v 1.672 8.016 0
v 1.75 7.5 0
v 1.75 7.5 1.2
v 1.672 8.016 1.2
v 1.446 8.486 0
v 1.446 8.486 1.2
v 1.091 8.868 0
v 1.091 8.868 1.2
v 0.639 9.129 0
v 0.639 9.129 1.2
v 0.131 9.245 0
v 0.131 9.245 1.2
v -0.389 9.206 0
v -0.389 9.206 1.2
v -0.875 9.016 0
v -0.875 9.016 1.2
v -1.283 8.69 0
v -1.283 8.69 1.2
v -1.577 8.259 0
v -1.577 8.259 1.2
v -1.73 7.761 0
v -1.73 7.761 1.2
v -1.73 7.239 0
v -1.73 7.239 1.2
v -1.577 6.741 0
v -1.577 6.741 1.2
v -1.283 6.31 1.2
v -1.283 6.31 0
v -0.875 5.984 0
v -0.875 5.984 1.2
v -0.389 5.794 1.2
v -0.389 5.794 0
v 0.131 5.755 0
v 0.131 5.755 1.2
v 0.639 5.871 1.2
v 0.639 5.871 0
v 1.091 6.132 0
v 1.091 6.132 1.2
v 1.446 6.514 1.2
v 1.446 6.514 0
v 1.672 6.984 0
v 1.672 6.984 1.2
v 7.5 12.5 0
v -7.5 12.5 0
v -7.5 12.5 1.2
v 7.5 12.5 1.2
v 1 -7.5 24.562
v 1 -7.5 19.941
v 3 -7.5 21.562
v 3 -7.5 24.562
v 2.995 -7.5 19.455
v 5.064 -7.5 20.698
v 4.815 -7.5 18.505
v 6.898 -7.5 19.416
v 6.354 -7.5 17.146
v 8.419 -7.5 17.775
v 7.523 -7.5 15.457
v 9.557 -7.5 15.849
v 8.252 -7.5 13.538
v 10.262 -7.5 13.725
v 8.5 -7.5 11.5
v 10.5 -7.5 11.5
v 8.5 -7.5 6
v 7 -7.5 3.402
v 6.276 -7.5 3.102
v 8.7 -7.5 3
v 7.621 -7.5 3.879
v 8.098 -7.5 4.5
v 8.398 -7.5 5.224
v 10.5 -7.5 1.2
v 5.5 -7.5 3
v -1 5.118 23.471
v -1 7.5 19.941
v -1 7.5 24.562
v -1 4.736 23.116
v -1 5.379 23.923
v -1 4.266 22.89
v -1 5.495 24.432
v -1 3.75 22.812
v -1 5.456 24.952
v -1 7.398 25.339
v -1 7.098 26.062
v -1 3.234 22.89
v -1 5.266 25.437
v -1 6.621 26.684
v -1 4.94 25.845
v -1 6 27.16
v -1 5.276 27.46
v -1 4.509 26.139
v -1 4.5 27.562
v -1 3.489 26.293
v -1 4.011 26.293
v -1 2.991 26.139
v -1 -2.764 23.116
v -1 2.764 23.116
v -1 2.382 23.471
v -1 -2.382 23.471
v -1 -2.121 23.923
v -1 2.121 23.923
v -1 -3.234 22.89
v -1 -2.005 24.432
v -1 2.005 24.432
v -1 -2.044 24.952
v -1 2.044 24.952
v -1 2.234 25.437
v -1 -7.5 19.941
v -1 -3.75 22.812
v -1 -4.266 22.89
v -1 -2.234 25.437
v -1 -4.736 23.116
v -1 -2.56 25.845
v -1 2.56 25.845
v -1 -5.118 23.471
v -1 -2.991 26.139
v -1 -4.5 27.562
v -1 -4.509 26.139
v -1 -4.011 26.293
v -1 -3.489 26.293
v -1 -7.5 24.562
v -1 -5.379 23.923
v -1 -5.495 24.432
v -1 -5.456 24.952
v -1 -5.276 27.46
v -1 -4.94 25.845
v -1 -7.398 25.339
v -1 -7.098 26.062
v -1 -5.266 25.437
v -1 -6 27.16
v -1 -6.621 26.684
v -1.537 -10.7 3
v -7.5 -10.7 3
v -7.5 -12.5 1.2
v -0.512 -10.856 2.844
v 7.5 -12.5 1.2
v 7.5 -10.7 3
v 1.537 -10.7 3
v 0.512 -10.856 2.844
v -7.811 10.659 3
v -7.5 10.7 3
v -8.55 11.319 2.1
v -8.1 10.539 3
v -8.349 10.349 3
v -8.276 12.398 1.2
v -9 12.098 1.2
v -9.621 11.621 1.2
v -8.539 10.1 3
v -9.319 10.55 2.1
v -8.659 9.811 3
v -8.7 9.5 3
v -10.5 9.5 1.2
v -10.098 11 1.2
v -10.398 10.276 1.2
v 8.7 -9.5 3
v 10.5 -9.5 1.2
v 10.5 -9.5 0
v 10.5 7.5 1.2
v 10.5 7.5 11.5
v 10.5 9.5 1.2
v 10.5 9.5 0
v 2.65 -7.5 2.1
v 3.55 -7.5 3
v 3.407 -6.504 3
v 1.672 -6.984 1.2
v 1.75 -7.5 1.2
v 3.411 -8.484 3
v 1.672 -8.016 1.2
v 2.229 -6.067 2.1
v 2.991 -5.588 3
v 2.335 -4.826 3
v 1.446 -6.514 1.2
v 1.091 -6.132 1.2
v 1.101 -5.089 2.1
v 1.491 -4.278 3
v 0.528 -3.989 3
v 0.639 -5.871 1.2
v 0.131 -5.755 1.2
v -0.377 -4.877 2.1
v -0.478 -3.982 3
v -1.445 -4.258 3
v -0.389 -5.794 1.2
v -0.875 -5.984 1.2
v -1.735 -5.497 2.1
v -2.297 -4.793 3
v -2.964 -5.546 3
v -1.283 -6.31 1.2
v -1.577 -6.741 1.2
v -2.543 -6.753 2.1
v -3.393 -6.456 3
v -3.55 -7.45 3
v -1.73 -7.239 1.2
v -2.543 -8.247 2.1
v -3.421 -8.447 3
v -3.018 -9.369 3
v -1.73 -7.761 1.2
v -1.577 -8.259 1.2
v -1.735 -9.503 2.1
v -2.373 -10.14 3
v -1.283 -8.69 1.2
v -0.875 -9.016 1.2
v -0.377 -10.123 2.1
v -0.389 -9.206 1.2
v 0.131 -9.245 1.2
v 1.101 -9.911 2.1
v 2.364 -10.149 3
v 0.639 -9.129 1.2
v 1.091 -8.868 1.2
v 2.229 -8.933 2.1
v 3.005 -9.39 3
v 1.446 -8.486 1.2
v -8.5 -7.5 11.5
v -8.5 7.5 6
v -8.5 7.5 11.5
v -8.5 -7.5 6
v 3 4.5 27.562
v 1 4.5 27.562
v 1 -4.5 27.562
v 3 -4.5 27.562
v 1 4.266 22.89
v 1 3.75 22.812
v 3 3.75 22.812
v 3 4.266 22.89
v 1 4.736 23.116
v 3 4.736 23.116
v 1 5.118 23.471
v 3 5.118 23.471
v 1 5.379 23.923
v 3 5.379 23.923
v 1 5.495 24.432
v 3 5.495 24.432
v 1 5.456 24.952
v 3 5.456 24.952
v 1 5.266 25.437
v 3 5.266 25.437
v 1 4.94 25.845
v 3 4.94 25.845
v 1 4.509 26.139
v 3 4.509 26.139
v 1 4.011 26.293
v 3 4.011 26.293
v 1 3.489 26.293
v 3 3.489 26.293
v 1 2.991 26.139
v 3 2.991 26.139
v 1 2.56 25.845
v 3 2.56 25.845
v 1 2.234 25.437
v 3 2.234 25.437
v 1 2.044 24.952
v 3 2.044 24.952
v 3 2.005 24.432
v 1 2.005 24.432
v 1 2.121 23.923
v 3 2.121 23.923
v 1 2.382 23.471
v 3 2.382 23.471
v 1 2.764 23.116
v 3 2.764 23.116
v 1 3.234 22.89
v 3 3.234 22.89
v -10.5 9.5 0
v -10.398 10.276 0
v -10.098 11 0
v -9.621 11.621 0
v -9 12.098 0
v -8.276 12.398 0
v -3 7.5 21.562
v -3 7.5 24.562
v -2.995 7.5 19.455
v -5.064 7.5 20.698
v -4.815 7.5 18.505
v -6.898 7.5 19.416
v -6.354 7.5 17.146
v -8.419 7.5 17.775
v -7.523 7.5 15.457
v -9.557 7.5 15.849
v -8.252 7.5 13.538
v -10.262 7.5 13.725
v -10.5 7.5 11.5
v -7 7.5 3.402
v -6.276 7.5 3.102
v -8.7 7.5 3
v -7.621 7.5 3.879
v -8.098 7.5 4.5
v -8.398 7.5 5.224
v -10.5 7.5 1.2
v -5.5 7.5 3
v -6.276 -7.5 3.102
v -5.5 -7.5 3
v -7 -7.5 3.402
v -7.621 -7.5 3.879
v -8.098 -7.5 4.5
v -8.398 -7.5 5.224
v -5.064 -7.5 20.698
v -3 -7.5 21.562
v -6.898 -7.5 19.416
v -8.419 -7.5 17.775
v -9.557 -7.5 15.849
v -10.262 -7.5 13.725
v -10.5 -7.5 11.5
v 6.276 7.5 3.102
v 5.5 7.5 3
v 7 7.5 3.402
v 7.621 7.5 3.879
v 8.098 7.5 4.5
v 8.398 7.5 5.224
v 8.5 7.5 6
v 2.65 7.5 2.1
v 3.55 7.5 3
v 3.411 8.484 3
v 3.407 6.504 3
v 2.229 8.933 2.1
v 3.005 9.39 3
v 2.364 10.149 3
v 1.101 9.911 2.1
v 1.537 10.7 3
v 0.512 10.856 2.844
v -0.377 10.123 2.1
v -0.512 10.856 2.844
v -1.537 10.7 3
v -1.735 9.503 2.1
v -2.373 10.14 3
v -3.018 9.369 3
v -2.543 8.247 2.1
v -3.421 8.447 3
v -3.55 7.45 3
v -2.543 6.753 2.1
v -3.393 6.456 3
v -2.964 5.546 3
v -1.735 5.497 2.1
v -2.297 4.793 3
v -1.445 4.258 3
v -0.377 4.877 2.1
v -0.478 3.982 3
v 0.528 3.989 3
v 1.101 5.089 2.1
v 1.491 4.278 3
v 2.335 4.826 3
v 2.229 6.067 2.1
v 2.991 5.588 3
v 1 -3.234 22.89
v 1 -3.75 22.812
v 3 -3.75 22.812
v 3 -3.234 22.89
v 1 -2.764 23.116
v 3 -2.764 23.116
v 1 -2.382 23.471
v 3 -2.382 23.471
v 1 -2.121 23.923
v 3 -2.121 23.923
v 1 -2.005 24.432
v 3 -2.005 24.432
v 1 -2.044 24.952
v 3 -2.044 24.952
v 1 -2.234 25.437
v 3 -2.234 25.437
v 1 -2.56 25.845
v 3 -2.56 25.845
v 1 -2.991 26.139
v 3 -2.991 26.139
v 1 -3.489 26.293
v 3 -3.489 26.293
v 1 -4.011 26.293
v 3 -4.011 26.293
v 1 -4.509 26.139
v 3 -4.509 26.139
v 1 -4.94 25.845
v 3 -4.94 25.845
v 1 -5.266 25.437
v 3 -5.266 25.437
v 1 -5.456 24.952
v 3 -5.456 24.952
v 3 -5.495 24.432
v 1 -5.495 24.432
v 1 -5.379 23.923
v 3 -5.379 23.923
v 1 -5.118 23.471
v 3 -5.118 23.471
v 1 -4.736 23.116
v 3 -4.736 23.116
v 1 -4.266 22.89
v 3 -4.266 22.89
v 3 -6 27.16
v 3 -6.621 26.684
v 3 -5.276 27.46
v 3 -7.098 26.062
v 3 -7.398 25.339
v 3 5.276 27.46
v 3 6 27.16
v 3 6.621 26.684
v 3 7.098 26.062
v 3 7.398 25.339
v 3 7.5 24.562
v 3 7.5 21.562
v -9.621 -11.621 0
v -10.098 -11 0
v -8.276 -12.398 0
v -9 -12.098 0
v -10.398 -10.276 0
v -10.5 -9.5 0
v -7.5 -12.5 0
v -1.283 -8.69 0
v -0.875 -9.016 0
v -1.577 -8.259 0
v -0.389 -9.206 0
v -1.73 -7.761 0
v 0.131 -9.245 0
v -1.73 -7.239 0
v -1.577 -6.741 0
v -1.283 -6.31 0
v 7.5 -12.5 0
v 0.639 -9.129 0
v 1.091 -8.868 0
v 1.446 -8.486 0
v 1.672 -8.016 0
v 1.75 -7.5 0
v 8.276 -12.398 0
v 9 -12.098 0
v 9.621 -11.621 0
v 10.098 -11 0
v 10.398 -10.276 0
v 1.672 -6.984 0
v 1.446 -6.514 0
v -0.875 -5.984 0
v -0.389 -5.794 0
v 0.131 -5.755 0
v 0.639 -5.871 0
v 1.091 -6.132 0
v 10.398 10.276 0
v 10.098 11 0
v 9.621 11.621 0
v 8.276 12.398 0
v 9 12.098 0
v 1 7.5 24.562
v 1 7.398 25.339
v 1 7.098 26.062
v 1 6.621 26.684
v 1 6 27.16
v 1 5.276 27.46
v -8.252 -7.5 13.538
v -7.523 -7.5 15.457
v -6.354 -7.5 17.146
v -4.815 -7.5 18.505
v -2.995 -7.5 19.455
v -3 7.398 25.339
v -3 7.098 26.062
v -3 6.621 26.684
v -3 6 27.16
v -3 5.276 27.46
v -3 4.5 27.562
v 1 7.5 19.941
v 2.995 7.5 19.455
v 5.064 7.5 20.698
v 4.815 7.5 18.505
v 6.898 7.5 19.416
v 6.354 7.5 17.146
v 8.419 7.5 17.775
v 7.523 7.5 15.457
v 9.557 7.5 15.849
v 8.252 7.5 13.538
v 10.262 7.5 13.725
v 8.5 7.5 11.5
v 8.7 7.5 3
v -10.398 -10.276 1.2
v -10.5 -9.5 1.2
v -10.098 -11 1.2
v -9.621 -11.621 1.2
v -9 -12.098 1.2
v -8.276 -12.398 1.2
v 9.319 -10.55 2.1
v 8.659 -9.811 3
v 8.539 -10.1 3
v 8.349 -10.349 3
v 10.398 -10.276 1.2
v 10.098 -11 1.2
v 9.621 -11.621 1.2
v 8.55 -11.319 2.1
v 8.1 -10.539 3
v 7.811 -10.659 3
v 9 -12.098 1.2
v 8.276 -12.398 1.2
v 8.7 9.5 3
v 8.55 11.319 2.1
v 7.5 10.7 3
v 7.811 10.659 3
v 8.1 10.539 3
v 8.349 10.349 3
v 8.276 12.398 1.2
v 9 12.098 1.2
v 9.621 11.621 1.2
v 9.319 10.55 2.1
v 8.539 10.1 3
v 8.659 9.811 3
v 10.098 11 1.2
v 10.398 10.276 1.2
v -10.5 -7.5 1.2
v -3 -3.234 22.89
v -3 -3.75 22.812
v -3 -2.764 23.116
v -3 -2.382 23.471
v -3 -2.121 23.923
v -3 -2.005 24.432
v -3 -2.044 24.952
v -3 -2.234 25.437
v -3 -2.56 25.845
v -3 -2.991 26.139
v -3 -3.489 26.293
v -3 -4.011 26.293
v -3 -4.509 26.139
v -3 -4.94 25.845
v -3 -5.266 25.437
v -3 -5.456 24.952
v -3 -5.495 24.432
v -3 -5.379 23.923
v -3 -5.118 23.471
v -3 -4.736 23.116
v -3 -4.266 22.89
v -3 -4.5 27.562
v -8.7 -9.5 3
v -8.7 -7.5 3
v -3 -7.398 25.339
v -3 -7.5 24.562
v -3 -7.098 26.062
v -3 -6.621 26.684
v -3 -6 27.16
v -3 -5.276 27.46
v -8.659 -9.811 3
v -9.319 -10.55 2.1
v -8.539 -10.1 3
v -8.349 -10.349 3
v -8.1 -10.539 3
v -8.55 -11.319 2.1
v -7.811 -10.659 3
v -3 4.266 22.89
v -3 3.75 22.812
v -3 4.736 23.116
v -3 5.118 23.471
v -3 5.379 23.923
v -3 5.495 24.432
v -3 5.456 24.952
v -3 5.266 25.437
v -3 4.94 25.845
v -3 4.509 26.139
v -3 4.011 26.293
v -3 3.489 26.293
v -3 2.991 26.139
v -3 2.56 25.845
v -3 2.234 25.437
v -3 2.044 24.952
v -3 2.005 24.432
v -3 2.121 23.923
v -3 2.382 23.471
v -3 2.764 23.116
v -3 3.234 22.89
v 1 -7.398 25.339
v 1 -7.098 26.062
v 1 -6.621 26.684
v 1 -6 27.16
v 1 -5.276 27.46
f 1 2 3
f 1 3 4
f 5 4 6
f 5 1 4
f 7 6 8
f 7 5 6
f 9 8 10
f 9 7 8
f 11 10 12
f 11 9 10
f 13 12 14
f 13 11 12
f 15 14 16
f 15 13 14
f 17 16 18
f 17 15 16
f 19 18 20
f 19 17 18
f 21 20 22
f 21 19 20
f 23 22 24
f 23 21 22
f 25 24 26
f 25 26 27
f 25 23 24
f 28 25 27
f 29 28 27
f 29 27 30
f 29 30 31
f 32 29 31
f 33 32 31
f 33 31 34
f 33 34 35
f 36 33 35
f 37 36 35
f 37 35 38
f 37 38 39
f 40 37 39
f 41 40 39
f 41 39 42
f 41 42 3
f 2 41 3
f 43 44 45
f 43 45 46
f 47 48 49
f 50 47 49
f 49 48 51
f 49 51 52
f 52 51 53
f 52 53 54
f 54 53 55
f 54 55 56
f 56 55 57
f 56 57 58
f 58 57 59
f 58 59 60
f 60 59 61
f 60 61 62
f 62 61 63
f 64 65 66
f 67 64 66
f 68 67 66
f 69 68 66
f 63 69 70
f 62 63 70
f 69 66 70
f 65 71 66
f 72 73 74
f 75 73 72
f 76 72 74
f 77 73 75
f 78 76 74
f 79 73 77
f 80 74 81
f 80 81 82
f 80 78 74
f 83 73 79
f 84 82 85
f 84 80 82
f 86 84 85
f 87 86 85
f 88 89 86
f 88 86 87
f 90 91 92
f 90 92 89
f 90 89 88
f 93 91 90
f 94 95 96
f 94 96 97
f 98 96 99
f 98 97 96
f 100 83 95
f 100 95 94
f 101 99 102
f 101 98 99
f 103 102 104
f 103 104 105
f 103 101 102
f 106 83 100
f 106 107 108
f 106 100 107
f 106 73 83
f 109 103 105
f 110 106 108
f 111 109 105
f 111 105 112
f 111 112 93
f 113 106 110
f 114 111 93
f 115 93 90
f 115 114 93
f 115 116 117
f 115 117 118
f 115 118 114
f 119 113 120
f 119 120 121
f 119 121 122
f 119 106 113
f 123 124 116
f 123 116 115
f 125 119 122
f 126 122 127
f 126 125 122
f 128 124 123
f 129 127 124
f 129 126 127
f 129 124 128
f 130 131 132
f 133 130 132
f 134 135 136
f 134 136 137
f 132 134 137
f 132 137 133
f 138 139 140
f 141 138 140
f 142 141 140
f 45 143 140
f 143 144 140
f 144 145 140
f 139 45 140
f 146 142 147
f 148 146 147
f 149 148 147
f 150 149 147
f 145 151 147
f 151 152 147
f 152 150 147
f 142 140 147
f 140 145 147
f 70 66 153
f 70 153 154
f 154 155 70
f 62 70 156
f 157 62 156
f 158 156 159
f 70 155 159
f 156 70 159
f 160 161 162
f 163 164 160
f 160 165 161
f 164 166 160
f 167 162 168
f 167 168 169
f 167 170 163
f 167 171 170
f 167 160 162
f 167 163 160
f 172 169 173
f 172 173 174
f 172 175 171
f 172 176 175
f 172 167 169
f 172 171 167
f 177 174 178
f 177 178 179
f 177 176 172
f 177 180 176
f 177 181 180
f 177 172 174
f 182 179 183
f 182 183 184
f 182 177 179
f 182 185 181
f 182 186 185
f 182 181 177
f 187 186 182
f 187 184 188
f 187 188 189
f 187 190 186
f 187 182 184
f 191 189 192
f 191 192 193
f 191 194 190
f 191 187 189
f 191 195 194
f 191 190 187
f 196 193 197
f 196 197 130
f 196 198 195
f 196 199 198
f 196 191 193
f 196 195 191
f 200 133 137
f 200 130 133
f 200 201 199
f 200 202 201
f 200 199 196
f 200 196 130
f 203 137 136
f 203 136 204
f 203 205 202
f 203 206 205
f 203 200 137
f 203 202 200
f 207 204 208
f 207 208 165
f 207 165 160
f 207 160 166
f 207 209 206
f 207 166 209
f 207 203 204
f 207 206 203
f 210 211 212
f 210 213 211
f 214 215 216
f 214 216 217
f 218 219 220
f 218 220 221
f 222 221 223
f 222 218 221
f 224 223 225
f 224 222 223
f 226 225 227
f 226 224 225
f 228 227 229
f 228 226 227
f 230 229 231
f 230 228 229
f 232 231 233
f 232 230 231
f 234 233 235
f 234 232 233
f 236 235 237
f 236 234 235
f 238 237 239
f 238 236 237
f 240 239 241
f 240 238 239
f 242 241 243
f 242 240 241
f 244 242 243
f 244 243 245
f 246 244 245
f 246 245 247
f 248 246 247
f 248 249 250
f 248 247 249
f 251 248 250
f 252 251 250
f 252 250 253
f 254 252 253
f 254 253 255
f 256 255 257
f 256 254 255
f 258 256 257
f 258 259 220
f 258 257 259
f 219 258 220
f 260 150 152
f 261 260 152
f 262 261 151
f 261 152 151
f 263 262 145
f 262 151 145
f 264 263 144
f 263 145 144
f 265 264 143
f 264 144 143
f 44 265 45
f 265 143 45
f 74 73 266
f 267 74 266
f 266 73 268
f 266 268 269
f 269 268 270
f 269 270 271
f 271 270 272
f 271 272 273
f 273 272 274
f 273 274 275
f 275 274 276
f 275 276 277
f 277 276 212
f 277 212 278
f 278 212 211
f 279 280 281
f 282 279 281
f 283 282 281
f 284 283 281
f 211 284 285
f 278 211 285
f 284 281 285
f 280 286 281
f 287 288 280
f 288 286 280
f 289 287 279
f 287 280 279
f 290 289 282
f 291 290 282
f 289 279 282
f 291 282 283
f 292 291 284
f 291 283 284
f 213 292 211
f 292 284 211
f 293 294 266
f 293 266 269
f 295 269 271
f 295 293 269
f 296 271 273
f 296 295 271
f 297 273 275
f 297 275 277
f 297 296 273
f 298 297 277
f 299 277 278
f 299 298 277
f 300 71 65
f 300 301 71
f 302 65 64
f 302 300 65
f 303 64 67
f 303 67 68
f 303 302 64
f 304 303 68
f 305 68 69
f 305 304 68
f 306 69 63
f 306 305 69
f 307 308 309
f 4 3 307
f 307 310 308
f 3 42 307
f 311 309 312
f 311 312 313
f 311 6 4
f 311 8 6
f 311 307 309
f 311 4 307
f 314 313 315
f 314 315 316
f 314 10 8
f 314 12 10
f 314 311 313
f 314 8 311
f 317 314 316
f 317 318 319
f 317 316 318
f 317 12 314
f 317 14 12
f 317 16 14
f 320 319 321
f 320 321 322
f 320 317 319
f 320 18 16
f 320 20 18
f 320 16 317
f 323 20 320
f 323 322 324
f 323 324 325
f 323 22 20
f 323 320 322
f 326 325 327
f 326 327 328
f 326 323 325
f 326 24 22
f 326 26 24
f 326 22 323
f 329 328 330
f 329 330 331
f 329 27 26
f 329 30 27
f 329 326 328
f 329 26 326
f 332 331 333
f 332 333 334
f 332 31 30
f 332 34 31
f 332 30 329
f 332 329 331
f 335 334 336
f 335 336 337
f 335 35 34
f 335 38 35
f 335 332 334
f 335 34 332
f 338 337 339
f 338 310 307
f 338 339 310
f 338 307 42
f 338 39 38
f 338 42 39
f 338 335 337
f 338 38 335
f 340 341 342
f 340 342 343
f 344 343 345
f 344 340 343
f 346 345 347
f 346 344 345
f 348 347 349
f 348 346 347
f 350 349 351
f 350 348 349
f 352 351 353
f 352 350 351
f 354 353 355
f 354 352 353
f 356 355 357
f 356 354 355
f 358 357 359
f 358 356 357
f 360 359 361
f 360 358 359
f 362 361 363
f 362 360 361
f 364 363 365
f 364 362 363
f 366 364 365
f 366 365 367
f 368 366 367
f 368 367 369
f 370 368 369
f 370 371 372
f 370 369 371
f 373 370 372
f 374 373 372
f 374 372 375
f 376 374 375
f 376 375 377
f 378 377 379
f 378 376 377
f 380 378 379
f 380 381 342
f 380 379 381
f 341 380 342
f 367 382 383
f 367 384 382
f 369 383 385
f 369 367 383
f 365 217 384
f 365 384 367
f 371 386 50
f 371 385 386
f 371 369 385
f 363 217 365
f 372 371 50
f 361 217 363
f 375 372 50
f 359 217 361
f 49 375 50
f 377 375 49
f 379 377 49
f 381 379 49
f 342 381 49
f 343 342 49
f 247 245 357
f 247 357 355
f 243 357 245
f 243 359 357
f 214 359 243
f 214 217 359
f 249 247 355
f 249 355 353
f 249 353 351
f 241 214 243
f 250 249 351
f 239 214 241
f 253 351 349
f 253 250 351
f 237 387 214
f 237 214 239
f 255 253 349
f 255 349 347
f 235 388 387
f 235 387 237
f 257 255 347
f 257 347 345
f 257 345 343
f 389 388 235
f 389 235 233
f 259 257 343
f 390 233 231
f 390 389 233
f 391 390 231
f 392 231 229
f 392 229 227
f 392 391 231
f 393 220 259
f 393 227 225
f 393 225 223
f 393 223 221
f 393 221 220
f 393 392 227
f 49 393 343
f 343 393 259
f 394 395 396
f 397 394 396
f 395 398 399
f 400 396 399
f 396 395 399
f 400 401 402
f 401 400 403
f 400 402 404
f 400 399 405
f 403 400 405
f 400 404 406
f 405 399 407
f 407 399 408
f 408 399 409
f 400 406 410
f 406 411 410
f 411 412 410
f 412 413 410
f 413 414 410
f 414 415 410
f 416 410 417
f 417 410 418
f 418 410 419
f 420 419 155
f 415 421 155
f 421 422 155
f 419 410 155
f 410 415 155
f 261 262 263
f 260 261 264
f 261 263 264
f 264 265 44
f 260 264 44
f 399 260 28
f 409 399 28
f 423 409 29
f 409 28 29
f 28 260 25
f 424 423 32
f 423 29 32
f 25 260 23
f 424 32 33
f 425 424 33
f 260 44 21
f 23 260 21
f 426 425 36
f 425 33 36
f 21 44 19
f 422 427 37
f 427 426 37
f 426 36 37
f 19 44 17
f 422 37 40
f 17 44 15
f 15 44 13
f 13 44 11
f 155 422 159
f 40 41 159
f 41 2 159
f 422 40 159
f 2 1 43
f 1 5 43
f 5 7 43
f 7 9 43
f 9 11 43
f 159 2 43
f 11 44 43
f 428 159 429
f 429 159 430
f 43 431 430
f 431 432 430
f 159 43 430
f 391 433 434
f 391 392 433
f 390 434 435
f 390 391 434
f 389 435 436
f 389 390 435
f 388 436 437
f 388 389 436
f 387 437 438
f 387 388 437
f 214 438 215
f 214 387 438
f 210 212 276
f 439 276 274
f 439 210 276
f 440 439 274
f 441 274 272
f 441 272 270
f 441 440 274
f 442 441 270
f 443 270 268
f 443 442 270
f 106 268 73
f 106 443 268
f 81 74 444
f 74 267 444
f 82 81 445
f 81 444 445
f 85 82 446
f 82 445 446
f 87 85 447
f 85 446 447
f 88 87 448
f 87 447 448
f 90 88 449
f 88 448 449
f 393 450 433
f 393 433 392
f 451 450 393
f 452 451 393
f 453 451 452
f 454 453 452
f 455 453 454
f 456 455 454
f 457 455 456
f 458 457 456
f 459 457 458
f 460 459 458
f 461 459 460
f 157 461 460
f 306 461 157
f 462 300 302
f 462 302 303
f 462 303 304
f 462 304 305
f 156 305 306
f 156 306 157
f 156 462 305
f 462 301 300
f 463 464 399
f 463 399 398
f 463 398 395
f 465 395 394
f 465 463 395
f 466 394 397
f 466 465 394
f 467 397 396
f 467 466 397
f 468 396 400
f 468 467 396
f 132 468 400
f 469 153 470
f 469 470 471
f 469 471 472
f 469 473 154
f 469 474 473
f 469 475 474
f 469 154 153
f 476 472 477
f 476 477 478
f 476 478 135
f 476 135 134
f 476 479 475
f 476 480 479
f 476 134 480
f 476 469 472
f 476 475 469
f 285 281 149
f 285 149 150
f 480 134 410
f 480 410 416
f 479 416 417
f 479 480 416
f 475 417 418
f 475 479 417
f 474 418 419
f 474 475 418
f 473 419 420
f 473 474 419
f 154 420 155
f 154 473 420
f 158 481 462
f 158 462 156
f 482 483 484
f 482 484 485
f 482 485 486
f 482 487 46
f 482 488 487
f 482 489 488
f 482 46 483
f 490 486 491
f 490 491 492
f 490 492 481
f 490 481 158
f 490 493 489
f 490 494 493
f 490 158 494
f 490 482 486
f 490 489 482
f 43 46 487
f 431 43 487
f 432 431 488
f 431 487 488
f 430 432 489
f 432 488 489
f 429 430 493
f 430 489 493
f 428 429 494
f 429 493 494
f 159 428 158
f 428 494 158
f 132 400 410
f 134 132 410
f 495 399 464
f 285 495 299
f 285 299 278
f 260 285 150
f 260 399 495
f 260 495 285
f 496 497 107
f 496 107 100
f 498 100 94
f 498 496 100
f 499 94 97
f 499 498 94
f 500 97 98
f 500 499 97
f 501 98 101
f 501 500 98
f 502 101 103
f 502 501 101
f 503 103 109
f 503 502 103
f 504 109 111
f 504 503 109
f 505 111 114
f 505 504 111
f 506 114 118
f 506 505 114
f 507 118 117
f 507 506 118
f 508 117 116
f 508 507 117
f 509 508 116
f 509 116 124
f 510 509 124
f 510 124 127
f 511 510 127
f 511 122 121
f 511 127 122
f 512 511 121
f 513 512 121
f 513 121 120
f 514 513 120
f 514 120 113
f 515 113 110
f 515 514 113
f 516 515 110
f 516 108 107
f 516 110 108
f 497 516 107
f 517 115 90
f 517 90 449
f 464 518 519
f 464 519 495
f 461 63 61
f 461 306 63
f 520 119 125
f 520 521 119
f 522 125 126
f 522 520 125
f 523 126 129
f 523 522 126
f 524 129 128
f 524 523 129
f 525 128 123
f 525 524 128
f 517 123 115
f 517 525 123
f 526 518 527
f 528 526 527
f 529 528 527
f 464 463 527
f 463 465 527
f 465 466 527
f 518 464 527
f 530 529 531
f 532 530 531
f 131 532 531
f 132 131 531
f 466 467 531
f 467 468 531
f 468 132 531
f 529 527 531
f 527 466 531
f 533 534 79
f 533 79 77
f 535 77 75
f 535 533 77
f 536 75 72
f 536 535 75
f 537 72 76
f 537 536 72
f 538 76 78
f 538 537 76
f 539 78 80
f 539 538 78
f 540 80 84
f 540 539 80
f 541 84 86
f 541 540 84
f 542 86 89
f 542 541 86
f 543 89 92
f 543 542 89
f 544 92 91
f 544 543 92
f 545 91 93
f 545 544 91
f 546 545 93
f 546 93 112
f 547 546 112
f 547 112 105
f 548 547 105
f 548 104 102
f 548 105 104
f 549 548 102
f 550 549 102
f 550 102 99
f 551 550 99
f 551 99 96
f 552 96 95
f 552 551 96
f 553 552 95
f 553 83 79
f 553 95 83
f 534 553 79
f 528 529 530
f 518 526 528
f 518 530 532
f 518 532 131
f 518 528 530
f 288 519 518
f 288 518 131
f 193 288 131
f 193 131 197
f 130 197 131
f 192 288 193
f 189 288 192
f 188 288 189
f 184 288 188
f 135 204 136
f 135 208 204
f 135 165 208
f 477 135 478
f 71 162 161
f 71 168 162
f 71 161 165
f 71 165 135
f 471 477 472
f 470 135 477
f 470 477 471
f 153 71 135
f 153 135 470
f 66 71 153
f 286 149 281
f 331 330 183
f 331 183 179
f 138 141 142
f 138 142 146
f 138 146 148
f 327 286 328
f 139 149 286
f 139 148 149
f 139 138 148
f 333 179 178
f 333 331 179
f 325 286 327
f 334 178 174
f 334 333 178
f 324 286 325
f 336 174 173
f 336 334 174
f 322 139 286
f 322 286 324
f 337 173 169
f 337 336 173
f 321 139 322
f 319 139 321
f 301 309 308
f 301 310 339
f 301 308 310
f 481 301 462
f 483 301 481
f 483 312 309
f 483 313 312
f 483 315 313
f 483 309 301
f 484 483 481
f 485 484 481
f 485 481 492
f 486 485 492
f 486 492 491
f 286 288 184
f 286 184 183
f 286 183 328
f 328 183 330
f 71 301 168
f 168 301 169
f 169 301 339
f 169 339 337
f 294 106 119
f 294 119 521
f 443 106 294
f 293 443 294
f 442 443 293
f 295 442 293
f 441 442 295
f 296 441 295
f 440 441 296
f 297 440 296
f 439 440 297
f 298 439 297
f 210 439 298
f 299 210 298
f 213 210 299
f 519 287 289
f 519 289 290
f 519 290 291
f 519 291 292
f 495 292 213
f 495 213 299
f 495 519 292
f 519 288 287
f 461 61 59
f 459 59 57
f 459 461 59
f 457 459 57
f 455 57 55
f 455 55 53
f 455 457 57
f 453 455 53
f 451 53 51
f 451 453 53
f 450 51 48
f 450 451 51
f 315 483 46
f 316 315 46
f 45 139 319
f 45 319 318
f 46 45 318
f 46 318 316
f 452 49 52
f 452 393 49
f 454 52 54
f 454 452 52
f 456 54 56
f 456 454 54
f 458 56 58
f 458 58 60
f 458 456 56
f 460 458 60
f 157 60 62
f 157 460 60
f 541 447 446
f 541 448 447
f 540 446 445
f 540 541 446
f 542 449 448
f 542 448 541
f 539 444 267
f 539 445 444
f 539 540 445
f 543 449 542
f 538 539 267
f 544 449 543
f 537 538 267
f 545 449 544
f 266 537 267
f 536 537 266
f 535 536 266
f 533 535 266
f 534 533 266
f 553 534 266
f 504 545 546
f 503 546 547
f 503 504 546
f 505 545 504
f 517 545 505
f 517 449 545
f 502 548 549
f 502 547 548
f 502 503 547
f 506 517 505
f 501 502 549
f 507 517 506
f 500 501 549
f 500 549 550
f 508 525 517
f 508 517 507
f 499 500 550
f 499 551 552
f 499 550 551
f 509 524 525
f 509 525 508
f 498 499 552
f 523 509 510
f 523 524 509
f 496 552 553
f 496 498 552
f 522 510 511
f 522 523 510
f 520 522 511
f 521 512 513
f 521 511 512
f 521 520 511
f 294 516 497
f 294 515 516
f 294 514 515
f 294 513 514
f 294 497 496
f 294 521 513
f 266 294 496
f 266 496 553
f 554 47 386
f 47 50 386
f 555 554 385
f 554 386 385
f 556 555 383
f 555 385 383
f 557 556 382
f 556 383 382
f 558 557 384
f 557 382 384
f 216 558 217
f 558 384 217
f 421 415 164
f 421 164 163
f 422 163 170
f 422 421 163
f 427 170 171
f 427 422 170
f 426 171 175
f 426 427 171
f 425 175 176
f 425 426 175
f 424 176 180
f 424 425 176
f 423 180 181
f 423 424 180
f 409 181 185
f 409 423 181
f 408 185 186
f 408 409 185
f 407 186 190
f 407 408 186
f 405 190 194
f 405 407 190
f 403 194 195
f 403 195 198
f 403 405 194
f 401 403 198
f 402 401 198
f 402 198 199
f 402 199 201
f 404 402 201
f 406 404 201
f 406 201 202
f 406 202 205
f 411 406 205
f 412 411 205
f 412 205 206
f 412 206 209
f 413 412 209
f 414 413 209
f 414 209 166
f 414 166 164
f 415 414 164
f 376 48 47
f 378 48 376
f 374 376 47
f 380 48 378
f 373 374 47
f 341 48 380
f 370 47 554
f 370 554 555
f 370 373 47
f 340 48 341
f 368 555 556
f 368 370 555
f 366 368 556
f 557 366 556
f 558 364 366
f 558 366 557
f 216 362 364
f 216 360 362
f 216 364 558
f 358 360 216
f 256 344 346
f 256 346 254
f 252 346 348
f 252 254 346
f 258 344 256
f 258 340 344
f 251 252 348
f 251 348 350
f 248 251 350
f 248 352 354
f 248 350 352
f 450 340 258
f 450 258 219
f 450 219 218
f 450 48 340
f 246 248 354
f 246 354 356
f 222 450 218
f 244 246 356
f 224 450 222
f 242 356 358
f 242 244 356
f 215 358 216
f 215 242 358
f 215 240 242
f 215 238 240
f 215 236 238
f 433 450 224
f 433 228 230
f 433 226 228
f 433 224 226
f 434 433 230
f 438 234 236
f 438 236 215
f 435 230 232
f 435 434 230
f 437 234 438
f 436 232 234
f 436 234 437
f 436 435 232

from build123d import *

# Parameters (mm, degrees)
SKETCH1_W               = 21
SKETCH1_H               = 25
SKETCH1_R               = 1.75
BOSS_EXTRUDE1_DEPTH     = 3
BOSS_EXTRUDE2_DEPTH     = 7.5
CUT_EXTRUDE1_DEPTH      = 34.138809672
CUT_EXTRUDE1_DEPTH_BACK = 34.138809672
SKETCH4_R               = 1.75
FILLET1_R               = 3
FILLET3_R               = 3
CHAMFER1_SIZE           = 1.8


with BuildPart() as part:
    # Sketch1 → Boss-Extrude1 (new body)
    with BuildSketch(Plane.XY):
        Rectangle(SKETCH1_W, SKETCH1_H)
        with Locations((0, 7.5)):
            Circle(SKETCH1_R, mode=Mode.SUBTRACT)
        with Locations((0, -7.5)):
            Circle(SKETCH1_R, mode=Mode.SUBTRACT)
    extrude(amount=BOSS_EXTRUDE1_DEPTH)

    # Sketch3 → Boss-Extrude2 (add, symmetric)
    with BuildSketch(Plane(origin=(0, 0, 0), x_dir=(1, 0, 0), z_dir=(0, 1, 0))):
        with BuildLine():
            Line((-8.5, -3), (-8.5, -11.5))
            ThreePointArc((-8.5, -11.5), (-6.354132514, -17.145794895), (-1, -19.940971508))
            Line((-1, -19.940971508), (-1, -27.562305899))
            Line((-1, -27.562305899), (-3, -27.562305899))
            Line((-3, -27.562305899), (-3, -21.562305899))
            ThreePointArc((-3, -21.562305899), (-8.41872912, -17.774950199), (-10.5, -11.5))
            Line((-10.5, -11.5), (-10.5, -3))
            Line((-10.5, -3), (-8.5, -3))
        make_face()
        with BuildLine():
            Line((10.5, -11.5), (10.5, -3))
            Line((10.5, -3), (8.5, -3))
            Line((8.5, -3), (8.5, -11.5))
            ThreePointArc((8.5, -11.5), (6.354132514, -17.145794895), (1, -19.940971508))
            Line((1, -19.940971508), (1, -27.562305899))
            Line((1, -27.562305899), (3, -27.562305899))
            Line((3, -27.562305899), (3, -21.562305899))
            ThreePointArc((3, -21.562305899), (8.41872912, -17.774950199), (10.5, -11.5))
        make_face()
    extrude(amount=BOSS_EXTRUDE2_DEPTH, both=True)

    # Sketch4 → Cut-Extrude1 (cut, two sides: drawn at the far end of the back side and taken through both)
    with BuildSketch(Plane(origin=(3, 0, 0), x_dir=(0, 0, -1), z_dir=(1, 0, 0)).offset(-CUT_EXTRUDE1_DEPTH_BACK)):
        with Locations((-24.562305899, 3.75)):
            Circle(SKETCH4_R)
        with Locations((-24.562305899, -3.75)):
            Circle(SKETCH4_R)
    extrude(amount=CUT_EXTRUDE1_DEPTH + CUT_EXTRUDE1_DEPTH_BACK, mode=Mode.SUBTRACT)

    # Fillet1
    fillet1_edges = [part.edges().sort_by_distance(p)[0] for p in [
        (-2, -7.5, 27.562305899),
        (-2, 7.5, 27.562305899),
        (2, -7.5, 27.562305899),
        (2, 7.5, 27.562305899),
        (10.5, -12.5, 1.5),
        (-10.5, -12.5, 1.5),
        (-10.5, 12.5, 1.5),
        (10.5, 12.5, 1.5),
    ]]
    fillet(fillet1_edges, radius=FILLET1_R)

    # Fillet3
    fillet3_edges = [part.edges().sort_by_distance(p)[0] for p in [
        (-8.5, 0, 3),
        (8.5, 0, 3),
    ]]
    fillet(fillet3_edges, radius=FILLET3_R)

    # Chamfer1
    # the kernel refuses this chamfer: 1.8 mm, written as the material it takes off along each edge
    with BuildSketch(Plane(origin=(-7.5, 12.5, 3), x_dir=(0, -0.9996219169112966, 0.027495876610586382), z_dir=(1, 0, 0)), Plane(origin=(7.5, -12.5, 3), x_dir=(0, 0.9996219169112966, 0.027495876610586382), z_dir=(-1, 0, 0))) as chamfer1_piece_1:
        Polygon((CHAMFER1_SIZE * 0.999621916911, CHAMFER1_SIZE * 0.0274958766106), (-CHAMFER1_SIZE * 0.0274958766106, CHAMFER1_SIZE * 0.999621916911), (0, 0), align=None)
    extrude(amount=15, mode=Mode.SUBTRACT)
    with BuildSketch(Plane(origin=(10.5, -7.5, 3), x_dir=(-0.9996219169112966, 0, 0.027495876610586382), z_dir=(0, -1, 0)), Plane(origin=(-10.5, -9.5, 3), x_dir=(0.9996219169112966, 0, 0.027495876610586382), z_dir=(0, 1, 0)), Plane(origin=(10.5, 9.5, 3), x_dir=(-0.9996219169112966, 0, 0.027495876610586382), z_dir=(0, -1, 0)), Plane(origin=(-10.5, 7.5, 3), x_dir=(0.9996219169112966, 0, 0.027495876610586382), z_dir=(0, 1, 0))) as chamfer1_piece_2:
        Polygon((CHAMFER1_SIZE * 0.999621916911, CHAMFER1_SIZE * 0.0274958766106), (-CHAMFER1_SIZE * 0.0274958766106, CHAMFER1_SIZE * 0.999621916911), (0, 0), align=None)
    extrude(amount=2, mode=Mode.SUBTRACT)
    with BuildSketch(Plane(origin=(7.5, 9.5, 3), x_dir=(0, 1, 0), z_dir=(-1, 0, 0))) as chamfer1_piece_3:
        Polygon((3 - CHAMFER1_SIZE, 0), (3, CHAMFER1_SIZE), (3, 0), align=None)
    revolve(axis=Axis((7.5, 9.5, 3), (0, 0, -1)), revolution_arc=90, mode=Mode.SUBTRACT)
    with BuildSketch(Plane(origin=(7.5, -9.5, 3), x_dir=(1, 0, 0), z_dir=(0, 1, 0))) as chamfer1_piece_4:
        Polygon((3 - CHAMFER1_SIZE, 0), (3, CHAMFER1_SIZE), (3, 0), align=None)
    revolve(axis=Axis((7.5, -9.5, 3), (0, 0, -1)), revolution_arc=90, mode=Mode.SUBTRACT)
    with BuildSketch(Plane(origin=(-7.5, -9.5, 3), x_dir=(-1, 0, 0), z_dir=(0, 1, 0))) as chamfer1_piece_5:
        Polygon((3 - CHAMFER1_SIZE, 0), (3, -CHAMFER1_SIZE), (3, 0), align=None)
    revolve(axis=Axis((-7.5, -9.5, 3), (0, 0, 1)), revolution_arc=90, mode=Mode.SUBTRACT)
    with BuildSketch(Plane(origin=(-7.5, 9.5, 3), x_dir=(0, 1, 0), z_dir=(1, 0, 0))) as chamfer1_piece_6:
        Polygon((3 - CHAMFER1_SIZE, 0), (3, -CHAMFER1_SIZE), (3, 0), align=None)
    revolve(axis=Axis((-7.5, 9.5, 3), (0, 0, 1)), revolution_arc=90, mode=Mode.SUBTRACT)
    with BuildSketch(Plane(origin=(0, 7.5, 3), x_dir=(1, 0, 0), z_dir=(0, -1, 0))) as chamfer1_piece_7:
        Polygon((1.75 + CHAMFER1_SIZE, 0), (1.75, -CHAMFER1_SIZE), (1.75, 0), align=None)
    revolve(axis=Axis((0, 7.5, 3), (0, 0, 1)), mode=Mode.SUBTRACT)
    with BuildSketch(Plane(origin=(0, -7.5, 3), x_dir=(1, 0, 0), z_dir=(0, -1, 0))) as chamfer1_piece_8:
        Polygon((1.75 + CHAMFER1_SIZE, 0), (1.75, -CHAMFER1_SIZE), (1.75, 0), align=None)
    revolve(axis=Axis((0, -7.5, 3), (0, 0, 1)), mode=Mode.SUBTRACT)


solid = part.part
